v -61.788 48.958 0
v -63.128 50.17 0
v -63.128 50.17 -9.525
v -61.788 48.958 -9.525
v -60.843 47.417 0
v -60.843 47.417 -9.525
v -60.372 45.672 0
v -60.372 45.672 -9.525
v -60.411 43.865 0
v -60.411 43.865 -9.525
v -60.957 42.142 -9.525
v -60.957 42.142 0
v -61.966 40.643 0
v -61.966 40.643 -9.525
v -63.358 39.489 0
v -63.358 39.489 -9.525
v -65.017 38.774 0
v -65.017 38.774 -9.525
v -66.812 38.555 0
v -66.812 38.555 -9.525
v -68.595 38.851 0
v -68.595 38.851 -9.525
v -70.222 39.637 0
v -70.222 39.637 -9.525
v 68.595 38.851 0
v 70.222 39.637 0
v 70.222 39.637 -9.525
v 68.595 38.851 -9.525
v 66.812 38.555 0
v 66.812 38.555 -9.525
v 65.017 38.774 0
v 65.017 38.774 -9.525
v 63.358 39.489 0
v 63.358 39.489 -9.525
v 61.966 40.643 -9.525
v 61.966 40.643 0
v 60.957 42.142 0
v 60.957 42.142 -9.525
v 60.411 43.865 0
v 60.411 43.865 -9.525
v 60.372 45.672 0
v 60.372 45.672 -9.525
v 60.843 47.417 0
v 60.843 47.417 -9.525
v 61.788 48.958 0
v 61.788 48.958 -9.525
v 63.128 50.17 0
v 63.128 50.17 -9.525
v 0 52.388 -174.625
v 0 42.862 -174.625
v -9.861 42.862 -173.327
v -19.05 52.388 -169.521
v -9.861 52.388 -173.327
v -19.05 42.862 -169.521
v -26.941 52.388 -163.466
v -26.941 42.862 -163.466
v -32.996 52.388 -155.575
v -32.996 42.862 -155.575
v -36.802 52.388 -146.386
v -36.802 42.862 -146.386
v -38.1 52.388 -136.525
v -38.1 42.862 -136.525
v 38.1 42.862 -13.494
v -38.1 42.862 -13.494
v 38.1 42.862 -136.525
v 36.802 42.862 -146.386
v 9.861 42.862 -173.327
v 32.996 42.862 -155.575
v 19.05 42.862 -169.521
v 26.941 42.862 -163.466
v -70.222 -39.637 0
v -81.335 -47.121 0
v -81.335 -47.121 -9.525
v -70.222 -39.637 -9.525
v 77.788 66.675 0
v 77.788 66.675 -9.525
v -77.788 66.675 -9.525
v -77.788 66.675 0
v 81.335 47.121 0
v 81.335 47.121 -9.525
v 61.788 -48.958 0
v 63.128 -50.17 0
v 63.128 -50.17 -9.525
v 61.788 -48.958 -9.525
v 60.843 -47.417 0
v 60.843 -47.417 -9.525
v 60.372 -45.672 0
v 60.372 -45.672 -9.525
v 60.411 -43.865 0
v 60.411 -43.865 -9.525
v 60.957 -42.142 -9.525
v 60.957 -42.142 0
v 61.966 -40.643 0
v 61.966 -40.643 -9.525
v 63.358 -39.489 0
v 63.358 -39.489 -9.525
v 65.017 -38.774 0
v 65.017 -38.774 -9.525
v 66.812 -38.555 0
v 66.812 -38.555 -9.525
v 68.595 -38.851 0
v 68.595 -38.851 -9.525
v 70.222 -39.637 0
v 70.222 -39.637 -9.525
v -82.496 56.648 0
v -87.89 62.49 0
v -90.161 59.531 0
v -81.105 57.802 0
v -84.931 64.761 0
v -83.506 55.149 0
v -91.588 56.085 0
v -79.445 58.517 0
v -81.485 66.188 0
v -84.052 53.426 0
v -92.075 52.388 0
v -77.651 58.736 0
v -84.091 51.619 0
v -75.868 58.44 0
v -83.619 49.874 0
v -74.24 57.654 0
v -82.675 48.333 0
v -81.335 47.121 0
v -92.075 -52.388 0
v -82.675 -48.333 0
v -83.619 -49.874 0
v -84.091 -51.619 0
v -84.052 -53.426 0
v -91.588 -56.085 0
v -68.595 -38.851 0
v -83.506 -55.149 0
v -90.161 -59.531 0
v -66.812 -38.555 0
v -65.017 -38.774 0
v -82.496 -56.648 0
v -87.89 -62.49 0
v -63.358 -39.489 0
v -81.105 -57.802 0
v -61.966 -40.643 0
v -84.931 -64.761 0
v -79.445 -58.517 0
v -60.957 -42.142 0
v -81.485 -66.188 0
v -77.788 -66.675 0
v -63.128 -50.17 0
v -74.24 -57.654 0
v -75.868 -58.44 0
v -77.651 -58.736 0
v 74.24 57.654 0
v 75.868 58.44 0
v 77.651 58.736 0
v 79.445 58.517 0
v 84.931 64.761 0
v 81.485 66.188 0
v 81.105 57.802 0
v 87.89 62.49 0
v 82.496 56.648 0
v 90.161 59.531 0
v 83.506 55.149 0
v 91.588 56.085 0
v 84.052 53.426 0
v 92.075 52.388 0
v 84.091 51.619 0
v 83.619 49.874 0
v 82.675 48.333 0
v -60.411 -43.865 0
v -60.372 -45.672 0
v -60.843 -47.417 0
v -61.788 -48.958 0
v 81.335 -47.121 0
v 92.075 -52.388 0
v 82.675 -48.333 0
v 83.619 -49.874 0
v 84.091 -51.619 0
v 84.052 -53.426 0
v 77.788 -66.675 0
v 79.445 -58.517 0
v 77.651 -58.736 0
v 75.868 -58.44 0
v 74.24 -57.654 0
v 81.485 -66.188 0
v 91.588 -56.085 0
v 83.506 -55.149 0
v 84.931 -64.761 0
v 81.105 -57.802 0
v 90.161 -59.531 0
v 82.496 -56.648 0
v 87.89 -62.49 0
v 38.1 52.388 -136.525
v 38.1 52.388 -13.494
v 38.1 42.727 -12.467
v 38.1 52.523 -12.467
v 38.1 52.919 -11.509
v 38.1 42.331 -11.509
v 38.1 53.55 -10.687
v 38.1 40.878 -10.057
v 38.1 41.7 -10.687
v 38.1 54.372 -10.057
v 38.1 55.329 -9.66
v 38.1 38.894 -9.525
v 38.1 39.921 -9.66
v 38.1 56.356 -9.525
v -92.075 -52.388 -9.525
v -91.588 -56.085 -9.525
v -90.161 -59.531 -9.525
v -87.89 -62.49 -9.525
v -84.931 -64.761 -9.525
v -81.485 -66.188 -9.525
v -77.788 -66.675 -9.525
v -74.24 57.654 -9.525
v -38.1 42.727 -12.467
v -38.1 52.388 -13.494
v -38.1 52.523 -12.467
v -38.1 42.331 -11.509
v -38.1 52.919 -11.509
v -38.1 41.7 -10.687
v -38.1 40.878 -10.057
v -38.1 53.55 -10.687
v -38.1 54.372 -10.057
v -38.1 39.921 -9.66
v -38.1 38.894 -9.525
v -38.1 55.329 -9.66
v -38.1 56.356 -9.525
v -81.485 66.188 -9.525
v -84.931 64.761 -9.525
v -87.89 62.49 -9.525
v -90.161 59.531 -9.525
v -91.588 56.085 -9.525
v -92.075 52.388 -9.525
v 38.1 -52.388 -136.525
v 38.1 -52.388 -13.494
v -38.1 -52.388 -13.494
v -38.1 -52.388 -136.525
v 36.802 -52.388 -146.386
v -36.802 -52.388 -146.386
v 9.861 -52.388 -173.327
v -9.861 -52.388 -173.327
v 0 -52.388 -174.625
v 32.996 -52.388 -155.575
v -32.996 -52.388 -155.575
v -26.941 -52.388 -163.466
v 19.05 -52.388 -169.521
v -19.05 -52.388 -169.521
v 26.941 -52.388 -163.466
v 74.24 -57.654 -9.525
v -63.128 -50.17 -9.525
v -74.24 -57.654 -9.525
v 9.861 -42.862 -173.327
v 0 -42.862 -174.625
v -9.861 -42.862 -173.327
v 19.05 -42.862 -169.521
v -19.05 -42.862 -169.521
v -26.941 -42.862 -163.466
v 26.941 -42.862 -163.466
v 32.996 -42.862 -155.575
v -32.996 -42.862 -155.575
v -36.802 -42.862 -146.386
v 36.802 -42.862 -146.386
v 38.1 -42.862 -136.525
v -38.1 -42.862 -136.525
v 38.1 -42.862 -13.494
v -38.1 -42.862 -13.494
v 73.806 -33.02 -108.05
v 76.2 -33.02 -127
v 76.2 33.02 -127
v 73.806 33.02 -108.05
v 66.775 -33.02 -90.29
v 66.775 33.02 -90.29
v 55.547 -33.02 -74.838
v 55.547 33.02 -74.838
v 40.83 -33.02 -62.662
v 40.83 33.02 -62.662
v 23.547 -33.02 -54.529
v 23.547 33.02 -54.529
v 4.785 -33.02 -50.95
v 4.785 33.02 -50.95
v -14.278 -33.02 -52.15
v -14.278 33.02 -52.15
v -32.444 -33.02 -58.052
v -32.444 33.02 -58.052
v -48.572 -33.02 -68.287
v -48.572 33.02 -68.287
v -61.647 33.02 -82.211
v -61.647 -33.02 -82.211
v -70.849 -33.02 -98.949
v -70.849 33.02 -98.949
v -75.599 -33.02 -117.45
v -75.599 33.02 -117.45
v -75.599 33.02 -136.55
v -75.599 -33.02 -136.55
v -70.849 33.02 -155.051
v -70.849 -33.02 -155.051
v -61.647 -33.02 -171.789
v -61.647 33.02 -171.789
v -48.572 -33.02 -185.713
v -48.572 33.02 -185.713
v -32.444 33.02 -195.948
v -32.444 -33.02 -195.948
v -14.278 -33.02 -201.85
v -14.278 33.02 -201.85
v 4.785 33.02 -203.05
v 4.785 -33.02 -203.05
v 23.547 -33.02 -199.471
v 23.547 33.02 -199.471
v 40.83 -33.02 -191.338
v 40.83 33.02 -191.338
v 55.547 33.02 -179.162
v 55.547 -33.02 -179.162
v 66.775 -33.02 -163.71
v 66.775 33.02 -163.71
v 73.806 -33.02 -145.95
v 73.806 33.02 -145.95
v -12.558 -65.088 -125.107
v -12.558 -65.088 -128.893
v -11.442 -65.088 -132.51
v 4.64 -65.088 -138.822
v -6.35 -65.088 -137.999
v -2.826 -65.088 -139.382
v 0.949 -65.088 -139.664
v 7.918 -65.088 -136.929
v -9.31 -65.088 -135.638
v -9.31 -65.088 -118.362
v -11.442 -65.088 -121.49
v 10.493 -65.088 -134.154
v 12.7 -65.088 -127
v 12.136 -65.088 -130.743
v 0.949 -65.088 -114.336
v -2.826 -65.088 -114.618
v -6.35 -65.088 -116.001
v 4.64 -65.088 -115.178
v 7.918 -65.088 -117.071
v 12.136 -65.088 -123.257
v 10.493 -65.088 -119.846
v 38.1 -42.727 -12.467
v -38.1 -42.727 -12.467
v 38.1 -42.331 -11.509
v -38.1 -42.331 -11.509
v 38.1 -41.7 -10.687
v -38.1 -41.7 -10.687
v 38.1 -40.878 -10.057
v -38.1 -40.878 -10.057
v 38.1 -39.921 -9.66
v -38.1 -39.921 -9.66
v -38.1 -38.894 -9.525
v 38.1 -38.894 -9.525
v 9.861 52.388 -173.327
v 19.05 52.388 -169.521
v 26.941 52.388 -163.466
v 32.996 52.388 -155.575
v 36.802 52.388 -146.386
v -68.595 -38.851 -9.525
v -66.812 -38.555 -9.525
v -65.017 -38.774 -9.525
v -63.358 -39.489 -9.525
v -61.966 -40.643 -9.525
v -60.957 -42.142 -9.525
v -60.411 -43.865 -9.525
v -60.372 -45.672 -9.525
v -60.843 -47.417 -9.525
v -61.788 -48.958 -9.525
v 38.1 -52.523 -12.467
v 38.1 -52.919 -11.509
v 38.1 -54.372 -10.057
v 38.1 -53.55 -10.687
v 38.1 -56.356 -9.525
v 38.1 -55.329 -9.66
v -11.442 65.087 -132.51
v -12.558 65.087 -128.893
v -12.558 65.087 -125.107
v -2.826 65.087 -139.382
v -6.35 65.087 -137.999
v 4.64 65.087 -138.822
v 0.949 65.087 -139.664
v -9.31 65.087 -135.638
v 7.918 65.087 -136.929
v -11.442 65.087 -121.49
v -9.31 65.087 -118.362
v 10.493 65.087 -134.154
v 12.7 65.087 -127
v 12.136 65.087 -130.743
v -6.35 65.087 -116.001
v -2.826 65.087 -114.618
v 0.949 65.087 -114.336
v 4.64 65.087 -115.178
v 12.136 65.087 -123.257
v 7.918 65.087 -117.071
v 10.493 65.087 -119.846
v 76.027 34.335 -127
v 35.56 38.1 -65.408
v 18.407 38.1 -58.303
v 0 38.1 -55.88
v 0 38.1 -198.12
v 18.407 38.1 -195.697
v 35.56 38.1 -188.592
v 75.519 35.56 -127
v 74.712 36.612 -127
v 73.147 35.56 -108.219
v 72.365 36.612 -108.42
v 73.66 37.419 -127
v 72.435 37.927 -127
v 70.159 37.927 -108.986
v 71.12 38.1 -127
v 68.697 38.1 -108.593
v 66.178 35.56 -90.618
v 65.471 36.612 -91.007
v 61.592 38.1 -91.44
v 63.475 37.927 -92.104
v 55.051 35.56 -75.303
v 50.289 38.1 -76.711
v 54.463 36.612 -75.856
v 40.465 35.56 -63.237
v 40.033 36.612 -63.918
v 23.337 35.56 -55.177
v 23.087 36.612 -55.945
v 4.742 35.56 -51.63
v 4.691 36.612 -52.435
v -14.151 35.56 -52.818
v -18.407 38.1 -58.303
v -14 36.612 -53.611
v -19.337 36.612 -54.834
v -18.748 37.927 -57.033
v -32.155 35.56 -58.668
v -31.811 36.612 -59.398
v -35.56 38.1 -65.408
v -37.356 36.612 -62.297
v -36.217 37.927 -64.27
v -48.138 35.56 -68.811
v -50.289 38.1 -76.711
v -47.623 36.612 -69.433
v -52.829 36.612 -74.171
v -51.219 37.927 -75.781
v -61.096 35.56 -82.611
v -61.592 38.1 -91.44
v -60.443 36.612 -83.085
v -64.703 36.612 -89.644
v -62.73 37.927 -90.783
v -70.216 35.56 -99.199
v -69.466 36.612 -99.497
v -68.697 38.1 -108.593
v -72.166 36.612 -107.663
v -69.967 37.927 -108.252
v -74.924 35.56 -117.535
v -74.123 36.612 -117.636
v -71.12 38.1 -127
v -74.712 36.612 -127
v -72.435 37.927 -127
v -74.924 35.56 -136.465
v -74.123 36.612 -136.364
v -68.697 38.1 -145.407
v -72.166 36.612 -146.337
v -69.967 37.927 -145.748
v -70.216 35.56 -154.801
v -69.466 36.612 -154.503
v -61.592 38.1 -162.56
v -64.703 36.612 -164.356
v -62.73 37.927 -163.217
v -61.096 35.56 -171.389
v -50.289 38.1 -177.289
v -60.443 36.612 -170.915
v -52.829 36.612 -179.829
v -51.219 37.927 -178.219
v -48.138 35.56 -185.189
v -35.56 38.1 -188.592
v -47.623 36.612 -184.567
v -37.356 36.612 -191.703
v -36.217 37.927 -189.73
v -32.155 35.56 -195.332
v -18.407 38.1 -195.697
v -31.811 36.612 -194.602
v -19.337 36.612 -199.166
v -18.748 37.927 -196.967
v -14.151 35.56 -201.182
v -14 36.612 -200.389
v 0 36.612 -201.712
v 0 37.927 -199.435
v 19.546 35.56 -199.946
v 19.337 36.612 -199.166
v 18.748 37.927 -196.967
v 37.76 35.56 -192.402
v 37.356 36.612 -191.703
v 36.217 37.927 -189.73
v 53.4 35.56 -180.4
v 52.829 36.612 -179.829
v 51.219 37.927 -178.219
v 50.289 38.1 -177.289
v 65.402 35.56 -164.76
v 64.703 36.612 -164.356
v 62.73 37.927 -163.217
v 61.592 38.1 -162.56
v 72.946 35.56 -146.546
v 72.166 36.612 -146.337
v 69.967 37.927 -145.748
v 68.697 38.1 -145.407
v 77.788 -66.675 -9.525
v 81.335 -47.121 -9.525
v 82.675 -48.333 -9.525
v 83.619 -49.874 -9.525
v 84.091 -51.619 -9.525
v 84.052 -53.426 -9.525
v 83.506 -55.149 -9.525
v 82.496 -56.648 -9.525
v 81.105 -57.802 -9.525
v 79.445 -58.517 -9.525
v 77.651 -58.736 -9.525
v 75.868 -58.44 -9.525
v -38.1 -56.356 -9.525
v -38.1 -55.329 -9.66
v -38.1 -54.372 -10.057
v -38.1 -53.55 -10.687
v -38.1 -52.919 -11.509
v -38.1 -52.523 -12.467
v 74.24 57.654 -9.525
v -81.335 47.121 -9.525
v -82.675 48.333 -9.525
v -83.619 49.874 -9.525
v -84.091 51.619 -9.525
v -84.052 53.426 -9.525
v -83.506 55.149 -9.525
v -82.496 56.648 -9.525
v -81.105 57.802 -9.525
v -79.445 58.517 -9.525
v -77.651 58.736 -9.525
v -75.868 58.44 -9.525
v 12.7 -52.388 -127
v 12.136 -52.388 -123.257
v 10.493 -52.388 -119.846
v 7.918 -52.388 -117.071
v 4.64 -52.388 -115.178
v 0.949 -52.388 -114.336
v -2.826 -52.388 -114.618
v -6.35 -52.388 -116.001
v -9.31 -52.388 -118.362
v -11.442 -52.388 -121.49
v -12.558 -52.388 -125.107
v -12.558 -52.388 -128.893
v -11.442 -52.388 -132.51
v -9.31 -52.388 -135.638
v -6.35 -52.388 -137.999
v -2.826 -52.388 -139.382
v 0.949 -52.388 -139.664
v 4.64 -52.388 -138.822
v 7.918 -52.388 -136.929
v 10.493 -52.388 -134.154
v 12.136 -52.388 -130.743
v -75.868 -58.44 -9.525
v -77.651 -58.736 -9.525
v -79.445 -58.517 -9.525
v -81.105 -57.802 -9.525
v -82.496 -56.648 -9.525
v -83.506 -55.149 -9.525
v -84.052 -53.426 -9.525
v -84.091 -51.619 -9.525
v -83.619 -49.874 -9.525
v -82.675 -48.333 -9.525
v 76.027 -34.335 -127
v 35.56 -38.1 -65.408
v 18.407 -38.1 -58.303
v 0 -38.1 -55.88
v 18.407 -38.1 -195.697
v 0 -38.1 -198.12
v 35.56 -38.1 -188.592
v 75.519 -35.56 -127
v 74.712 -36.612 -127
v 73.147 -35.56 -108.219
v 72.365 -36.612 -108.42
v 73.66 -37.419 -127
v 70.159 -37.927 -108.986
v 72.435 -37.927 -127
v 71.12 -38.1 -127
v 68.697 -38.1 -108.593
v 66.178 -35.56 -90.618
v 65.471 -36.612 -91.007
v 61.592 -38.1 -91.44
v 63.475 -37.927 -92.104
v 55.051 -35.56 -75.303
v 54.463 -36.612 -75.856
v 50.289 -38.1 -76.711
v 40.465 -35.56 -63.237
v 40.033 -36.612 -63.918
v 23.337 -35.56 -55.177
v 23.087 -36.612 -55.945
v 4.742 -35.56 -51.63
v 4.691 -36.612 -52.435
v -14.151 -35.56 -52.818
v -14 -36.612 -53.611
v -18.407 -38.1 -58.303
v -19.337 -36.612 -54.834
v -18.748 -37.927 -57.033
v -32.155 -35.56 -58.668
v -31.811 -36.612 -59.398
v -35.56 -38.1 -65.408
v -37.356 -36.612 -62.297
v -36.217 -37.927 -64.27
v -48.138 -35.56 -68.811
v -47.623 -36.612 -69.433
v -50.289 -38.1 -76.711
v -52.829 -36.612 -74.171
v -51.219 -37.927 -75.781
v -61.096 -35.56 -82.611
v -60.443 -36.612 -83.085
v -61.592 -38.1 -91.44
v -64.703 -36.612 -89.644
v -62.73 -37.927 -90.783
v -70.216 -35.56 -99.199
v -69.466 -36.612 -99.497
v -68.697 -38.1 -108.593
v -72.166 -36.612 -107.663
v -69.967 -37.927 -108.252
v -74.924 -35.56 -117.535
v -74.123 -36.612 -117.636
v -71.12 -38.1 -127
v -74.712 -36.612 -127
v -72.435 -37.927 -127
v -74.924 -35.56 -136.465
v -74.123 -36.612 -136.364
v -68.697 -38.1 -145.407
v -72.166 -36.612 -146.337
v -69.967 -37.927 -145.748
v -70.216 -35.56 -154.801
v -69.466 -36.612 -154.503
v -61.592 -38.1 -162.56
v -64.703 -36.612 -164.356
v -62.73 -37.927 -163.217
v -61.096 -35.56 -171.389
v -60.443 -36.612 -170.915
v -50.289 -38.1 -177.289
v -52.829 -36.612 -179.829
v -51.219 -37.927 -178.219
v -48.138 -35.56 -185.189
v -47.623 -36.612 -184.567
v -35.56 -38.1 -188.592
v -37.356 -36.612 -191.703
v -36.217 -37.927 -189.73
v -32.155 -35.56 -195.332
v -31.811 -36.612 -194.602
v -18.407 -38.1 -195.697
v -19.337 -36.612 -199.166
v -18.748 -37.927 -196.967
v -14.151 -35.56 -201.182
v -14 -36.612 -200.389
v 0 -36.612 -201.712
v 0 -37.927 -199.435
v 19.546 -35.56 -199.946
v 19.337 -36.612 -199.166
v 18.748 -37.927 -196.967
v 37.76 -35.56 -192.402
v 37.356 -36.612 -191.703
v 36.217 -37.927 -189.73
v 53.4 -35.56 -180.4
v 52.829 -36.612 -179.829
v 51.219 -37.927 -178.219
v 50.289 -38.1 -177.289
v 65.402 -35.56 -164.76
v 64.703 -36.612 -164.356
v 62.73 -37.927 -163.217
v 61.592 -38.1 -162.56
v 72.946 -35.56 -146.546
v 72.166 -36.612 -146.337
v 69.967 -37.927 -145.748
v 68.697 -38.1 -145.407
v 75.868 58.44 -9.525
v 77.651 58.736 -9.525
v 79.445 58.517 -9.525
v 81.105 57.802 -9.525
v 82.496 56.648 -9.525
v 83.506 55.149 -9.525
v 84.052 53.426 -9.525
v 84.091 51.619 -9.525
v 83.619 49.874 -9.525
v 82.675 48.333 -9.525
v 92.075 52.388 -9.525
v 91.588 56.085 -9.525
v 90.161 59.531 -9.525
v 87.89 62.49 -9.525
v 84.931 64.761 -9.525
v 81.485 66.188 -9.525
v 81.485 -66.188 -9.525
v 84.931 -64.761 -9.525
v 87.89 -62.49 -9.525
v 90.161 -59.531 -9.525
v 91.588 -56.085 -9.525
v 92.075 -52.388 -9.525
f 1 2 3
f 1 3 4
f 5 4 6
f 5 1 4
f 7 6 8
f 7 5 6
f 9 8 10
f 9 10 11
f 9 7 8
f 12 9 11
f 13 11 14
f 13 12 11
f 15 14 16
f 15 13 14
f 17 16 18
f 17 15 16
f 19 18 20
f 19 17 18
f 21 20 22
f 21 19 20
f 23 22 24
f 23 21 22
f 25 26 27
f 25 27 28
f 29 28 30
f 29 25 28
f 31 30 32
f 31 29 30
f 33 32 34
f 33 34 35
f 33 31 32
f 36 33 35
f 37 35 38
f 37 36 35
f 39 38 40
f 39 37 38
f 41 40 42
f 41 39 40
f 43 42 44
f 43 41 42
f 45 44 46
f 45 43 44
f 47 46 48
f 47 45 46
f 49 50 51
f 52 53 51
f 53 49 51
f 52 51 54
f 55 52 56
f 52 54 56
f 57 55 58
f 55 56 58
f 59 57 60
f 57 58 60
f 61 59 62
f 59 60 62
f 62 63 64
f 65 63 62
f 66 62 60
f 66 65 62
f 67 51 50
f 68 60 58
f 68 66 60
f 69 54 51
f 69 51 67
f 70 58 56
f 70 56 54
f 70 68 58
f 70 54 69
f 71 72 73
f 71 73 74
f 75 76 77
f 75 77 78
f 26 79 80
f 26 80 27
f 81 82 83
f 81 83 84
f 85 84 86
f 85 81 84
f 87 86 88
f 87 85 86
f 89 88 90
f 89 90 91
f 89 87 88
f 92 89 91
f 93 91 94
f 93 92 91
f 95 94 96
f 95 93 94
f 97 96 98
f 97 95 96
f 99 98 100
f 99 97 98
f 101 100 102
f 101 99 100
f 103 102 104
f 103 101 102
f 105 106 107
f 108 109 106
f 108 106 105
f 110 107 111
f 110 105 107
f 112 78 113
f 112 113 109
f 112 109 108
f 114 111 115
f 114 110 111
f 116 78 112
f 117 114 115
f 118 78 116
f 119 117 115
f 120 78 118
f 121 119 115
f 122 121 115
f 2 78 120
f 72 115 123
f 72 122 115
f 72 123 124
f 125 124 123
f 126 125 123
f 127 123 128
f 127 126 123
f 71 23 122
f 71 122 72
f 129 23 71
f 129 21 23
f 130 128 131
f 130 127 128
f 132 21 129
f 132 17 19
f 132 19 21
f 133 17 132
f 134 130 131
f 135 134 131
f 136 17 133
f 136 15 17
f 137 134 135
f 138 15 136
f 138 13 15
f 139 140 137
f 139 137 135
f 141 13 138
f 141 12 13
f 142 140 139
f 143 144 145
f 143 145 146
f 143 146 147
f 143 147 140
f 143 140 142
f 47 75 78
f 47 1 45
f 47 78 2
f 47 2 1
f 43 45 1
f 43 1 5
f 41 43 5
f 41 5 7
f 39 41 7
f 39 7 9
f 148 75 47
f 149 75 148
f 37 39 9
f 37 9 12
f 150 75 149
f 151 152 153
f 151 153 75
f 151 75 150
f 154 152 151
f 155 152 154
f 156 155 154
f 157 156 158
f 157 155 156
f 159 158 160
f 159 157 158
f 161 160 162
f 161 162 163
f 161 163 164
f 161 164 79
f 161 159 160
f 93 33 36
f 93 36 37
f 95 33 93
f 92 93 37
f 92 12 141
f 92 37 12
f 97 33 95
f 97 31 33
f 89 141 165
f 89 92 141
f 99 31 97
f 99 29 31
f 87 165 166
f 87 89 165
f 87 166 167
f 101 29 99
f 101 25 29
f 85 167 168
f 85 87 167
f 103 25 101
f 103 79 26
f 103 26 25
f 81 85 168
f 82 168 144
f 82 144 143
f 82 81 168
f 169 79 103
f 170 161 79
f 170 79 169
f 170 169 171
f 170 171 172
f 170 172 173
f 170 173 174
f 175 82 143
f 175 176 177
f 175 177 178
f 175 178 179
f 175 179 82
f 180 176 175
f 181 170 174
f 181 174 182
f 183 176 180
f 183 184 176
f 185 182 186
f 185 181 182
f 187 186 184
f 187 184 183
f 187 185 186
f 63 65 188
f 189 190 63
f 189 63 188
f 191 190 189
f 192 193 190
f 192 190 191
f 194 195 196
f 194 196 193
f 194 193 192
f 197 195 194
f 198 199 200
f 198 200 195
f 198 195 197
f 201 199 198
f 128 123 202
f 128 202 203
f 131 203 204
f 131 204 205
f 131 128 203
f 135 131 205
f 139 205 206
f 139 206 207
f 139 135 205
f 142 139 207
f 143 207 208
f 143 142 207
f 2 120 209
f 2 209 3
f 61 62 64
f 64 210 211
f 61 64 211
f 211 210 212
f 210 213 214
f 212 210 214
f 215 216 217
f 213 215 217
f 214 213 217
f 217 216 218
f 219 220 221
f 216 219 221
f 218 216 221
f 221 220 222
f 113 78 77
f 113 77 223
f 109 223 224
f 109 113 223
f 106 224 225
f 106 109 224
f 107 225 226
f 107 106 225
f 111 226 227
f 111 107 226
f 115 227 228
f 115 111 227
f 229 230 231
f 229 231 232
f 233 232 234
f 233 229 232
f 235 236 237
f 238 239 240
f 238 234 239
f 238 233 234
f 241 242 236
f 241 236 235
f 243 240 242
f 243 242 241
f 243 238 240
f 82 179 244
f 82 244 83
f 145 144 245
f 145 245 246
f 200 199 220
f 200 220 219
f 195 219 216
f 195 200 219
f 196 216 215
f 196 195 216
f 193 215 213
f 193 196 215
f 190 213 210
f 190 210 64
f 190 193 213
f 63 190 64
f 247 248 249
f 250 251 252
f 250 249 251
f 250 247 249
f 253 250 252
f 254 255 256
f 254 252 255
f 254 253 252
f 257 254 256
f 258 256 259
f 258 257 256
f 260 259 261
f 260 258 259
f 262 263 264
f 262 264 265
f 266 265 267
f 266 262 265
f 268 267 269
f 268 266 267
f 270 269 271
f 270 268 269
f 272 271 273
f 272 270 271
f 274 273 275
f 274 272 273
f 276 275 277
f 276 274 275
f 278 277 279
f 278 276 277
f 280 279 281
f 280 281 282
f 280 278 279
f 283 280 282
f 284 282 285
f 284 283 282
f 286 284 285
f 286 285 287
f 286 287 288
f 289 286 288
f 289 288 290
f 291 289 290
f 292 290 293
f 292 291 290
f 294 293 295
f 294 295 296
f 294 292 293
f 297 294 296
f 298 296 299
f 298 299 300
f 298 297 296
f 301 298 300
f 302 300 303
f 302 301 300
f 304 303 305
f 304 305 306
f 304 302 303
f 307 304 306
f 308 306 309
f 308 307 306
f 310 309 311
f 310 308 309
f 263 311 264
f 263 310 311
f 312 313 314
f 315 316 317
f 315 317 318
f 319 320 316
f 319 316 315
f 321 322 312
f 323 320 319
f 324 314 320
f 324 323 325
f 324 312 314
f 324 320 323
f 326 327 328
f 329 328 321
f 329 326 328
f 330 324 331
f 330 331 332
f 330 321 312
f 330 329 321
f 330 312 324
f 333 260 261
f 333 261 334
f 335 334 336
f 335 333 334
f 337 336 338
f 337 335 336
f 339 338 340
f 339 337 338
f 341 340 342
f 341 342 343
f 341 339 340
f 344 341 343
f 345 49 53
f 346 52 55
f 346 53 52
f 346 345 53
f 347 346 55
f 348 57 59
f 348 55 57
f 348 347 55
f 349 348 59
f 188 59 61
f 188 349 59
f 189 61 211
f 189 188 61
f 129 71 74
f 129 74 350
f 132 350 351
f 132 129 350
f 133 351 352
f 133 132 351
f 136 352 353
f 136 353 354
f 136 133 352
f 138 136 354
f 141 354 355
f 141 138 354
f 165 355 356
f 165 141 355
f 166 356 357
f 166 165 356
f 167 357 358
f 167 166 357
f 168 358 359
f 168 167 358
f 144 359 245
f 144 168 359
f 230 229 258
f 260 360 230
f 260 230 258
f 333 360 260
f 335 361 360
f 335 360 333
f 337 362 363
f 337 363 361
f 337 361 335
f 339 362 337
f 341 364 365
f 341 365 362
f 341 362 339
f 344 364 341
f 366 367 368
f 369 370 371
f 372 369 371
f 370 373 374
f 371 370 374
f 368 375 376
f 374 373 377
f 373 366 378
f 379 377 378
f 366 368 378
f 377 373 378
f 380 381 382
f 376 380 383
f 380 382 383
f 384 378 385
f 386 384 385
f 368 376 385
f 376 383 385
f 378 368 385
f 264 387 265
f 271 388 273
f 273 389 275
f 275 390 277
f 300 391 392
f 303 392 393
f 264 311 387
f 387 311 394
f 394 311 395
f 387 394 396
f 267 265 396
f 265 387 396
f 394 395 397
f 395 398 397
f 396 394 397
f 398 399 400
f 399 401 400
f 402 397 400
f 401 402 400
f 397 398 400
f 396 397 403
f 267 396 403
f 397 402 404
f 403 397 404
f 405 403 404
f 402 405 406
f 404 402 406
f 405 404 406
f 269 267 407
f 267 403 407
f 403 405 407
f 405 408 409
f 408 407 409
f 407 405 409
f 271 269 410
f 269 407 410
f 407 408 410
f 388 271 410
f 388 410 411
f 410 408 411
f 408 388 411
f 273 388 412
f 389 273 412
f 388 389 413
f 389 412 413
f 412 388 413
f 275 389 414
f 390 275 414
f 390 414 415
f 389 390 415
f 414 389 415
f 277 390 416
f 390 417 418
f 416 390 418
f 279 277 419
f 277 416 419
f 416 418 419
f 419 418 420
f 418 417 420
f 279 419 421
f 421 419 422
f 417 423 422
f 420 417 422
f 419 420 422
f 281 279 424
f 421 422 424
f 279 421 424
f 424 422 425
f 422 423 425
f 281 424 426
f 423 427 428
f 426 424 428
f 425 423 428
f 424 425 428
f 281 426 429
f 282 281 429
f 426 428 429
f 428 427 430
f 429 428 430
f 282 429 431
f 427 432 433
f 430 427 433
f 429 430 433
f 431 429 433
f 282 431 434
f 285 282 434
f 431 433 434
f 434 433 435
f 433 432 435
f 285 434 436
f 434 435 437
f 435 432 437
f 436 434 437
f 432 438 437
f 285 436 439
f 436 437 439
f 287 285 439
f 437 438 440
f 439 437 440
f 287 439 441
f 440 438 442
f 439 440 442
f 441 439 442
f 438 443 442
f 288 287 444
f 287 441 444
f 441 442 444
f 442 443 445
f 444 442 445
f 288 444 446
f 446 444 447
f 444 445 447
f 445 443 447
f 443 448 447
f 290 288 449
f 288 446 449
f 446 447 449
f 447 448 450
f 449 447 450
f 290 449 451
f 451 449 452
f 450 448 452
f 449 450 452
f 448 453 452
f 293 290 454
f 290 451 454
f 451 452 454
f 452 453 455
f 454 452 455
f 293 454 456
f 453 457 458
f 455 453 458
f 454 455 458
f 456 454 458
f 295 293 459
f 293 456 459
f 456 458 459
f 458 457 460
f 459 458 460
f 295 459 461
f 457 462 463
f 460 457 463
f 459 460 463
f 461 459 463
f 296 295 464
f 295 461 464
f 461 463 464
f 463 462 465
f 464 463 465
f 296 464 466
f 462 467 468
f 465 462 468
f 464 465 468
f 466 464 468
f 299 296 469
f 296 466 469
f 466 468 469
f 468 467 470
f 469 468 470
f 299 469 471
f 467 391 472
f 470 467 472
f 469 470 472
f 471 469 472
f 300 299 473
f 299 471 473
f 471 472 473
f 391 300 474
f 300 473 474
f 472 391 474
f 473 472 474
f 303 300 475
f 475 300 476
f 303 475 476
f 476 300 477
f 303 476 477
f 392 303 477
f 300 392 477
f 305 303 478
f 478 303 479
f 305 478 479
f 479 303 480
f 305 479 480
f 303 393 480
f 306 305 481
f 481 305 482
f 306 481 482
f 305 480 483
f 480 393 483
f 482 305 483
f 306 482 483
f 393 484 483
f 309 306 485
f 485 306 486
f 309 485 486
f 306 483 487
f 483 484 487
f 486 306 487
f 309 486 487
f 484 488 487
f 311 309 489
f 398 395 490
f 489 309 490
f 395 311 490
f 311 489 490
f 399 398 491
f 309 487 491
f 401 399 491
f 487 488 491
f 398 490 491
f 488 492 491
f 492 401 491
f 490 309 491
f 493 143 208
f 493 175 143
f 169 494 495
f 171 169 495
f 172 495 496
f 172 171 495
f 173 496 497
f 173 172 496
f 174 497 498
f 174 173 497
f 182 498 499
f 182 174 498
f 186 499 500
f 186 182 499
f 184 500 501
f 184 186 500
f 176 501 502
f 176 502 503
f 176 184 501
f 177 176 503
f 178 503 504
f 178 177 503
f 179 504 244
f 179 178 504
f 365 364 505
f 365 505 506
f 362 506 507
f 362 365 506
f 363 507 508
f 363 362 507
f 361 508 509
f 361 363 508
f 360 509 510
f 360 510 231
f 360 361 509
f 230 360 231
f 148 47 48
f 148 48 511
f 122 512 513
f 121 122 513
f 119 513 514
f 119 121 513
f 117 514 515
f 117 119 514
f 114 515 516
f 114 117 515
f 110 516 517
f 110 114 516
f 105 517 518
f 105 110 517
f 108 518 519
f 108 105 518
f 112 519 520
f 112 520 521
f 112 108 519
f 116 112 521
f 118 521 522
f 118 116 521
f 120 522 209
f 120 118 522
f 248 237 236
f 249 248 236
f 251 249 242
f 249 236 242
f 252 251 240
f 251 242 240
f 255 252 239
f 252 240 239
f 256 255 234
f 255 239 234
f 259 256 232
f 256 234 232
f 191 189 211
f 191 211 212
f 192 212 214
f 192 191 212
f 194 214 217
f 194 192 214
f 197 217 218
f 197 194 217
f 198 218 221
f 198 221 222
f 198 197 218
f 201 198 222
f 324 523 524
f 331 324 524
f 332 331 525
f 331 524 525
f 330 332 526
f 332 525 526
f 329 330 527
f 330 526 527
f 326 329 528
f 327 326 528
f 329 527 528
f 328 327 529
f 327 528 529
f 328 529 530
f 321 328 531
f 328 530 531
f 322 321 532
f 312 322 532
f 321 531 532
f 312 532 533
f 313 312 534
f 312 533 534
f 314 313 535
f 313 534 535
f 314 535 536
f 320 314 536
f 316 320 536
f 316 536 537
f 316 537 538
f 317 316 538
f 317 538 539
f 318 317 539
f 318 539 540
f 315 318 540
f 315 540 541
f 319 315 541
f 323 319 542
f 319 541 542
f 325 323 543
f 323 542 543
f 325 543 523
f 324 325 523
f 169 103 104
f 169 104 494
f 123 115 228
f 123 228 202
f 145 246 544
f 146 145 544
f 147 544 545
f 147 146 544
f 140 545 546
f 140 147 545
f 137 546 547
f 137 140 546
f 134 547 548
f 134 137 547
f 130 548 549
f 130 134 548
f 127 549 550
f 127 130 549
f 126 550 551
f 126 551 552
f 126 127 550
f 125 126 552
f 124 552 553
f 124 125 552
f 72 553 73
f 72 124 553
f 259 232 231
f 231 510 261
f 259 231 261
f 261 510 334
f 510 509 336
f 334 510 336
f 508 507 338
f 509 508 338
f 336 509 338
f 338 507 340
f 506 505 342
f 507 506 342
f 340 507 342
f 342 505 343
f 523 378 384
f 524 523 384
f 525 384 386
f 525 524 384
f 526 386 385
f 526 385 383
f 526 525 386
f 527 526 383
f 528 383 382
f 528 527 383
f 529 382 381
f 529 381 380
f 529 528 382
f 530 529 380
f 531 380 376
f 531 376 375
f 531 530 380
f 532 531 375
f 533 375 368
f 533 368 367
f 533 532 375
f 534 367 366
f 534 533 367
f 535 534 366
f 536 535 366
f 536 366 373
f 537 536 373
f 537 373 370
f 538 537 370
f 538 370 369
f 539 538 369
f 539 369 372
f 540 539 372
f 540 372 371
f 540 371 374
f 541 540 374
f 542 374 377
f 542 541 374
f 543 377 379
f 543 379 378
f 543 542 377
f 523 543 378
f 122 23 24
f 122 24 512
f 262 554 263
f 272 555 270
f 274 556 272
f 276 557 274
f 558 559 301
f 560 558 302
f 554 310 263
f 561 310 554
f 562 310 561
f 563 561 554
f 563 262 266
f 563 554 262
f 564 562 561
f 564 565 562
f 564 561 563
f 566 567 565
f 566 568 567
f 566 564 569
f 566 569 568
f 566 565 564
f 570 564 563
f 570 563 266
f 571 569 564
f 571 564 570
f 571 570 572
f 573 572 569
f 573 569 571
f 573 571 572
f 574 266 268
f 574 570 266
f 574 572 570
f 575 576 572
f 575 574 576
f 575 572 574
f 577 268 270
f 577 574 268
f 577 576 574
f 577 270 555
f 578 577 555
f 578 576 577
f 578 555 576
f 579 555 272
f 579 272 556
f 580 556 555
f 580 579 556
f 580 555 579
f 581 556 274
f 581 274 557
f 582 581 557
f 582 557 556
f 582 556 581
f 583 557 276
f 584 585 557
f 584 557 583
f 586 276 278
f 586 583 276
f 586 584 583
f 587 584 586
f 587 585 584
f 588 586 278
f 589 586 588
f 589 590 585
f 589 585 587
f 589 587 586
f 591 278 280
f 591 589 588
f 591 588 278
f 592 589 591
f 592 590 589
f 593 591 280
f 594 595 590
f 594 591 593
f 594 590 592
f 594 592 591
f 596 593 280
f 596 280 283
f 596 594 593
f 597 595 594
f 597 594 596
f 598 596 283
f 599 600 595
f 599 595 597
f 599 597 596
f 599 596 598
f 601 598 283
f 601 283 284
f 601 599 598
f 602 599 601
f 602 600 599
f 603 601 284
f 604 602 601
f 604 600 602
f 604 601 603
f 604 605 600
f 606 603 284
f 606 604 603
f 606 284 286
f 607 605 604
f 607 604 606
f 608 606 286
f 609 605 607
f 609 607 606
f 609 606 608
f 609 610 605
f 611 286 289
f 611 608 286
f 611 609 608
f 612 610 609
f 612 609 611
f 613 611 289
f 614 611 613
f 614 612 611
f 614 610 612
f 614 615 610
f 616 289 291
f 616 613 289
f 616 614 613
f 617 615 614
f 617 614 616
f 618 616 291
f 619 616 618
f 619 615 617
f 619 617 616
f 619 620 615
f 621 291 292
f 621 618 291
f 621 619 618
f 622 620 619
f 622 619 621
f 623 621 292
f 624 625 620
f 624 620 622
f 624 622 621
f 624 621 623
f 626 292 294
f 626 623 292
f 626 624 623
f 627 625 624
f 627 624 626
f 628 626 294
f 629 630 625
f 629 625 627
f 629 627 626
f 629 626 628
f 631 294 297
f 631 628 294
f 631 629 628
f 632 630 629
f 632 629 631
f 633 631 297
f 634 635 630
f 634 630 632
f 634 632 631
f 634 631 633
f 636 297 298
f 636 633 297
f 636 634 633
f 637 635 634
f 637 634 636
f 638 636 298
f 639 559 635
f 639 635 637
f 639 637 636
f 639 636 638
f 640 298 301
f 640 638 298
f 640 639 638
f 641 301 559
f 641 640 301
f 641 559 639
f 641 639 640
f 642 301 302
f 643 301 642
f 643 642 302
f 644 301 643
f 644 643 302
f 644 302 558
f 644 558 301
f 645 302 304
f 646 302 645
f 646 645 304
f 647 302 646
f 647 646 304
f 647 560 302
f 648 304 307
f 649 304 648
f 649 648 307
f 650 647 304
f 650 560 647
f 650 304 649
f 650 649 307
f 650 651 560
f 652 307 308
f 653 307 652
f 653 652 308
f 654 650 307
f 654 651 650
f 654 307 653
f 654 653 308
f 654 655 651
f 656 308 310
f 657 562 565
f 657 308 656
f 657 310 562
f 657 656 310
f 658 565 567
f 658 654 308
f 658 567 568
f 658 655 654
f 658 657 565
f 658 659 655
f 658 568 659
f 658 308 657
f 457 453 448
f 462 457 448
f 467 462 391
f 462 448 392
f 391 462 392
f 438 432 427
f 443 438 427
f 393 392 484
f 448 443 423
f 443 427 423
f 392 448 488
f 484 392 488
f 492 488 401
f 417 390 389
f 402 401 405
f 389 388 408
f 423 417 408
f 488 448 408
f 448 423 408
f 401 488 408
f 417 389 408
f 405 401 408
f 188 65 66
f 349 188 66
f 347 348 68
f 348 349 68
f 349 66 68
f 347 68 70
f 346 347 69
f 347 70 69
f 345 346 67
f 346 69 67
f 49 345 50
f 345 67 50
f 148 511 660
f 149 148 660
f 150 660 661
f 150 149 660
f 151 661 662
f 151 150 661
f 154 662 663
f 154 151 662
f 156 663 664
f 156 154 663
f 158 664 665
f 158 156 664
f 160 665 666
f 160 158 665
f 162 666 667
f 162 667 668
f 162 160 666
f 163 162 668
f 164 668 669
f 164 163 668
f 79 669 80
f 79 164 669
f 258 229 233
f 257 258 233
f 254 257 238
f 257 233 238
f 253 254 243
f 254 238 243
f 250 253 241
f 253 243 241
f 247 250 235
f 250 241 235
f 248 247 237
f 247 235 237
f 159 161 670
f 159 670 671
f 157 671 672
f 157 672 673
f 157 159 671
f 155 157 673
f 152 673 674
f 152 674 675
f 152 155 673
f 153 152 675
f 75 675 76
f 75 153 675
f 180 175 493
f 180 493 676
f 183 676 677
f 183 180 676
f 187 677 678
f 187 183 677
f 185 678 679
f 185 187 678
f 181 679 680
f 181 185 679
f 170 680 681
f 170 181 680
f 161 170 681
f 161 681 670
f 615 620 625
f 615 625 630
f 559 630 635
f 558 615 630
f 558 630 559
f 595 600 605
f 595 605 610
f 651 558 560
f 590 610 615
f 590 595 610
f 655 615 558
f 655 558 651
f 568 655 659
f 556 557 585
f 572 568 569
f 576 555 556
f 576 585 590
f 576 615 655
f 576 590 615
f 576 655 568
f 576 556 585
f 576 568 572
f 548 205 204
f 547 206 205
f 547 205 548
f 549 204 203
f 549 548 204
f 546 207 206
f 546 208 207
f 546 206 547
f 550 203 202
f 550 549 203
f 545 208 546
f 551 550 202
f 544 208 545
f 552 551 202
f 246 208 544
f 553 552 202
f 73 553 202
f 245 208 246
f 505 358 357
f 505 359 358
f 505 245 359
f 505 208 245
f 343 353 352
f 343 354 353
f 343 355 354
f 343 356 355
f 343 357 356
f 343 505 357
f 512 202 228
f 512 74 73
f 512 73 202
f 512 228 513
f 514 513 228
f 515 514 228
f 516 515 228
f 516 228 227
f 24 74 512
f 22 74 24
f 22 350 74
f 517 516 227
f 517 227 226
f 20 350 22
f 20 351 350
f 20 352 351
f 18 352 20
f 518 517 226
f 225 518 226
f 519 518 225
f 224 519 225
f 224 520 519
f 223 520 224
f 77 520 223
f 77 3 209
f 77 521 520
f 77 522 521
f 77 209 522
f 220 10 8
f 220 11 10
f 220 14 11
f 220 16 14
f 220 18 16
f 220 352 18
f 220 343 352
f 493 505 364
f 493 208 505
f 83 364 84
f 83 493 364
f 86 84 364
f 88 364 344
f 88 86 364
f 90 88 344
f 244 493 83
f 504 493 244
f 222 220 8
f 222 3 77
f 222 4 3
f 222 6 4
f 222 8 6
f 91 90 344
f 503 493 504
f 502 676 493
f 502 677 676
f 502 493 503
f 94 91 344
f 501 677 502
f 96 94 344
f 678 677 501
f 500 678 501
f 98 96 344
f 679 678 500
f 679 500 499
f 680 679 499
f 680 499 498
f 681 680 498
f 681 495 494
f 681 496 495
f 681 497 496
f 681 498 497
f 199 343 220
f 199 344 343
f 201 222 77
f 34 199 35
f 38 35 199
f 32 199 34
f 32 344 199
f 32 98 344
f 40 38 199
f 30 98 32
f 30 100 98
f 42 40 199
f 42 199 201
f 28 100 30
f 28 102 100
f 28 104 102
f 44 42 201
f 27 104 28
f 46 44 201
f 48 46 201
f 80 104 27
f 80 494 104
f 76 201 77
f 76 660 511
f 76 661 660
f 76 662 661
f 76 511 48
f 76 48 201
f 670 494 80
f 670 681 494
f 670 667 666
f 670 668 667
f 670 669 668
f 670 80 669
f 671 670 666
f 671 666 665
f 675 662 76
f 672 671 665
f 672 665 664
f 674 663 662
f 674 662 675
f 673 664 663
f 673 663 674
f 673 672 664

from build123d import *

# Parameters (mm, degrees)
F1_DEPTH       = 9.525
F4_DEPTH       = 76.2
F6_DEPTH       = 119.0635
F9_DEPTH       = 76.2
F10_R          = 5.08
F11_R          = 12.7
F12_DEPTH      = 117.475
F12_DEPTH_BACK = 12.7


with BuildPart() as f1:
    # F0 (on Top) → F1 (new body)
    with BuildSketch(Plane.XY):
        with BuildLine():
            Line((-77.7875, -66.675), (77.7875, -66.675))
            ThreePointArc((77.7875, -66.675), (87.8902881362, -62.4902881362), (92.075, -52.3875))
            Line((92.075, -52.3875), (92.075, 52.3875))
            ThreePointArc((92.075, 52.3875), (87.8902881362, 62.4902881362), (77.7875, 66.675))
            Line((77.7875, 66.675), (-77.7875, 66.675))
            ThreePointArc((-77.7875, 66.675), (-87.8902881362, 62.4902881362), (-92.075, 52.3875))
            Line((-92.075, 52.3875), (-92.075, -52.3875))
            ThreePointArc((-92.075, -52.3875), (-87.8902881362, -62.4902881362), (-77.7875, -66.675))
        make_face()
        with BuildLine():
            ThreePointArc((-74.2403875903, -57.6544244871), (-83.0544244871, -55.9346124097), (-81.3346124097, -47.1205755129))
            Line((-81.3346124097, -47.1205755129), (-70.2221124097, -39.6366469415))
            ThreePointArc((-70.2221124097, -39.6366469415), (-61.4080755129, -41.3564590189), (-63.1278875903, -50.1704959157))
            Line((-63.1278875903, -50.1704959157), (-74.2403875903, -57.6544244871))
        make_face(mode=Mode.SUBTRACT)
        with BuildLine():
            ThreePointArc((81.3346124097, -47.1205755129), (83.0544244871, -55.9346124097), (74.2403875903, -57.6544244871))
            Line((74.2403875903, -57.6544244871), (63.1278875903, -50.1704959157))
            ThreePointArc((63.1278875903, -50.1704959157), (61.4080755129, -41.3564590189), (70.2221124097, -39.6366469415))
            Line((70.2221124097, -39.6366469415), (81.3346124097, -47.1205755129))
        make_face(mode=Mode.SUBTRACT)
        with BuildLine():
            ThreePointArc((-81.3346124097, 47.1205755129), (-83.0544244871, 55.9346124097), (-74.2403875903, 57.6544244871))
            Line((-74.2403875903, 57.6544244871), (-63.1278875903, 50.1704959157))
            ThreePointArc((-63.1278875903, 50.1704959157), (-61.4080755129, 41.3564590189), (-70.2221124097, 39.6366469415))
            Line((-70.2221124097, 39.6366469415), (-81.3346124097, 47.1205755129))
        make_face(mode=Mode.SUBTRACT)
        with BuildLine():
            ThreePointArc((74.2403875903, 57.6544244871), (83.0544244871, 55.9346124097), (81.3346124097, 47.1205755129))
            Line((81.3346124097, 47.1205755129), (70.2221124097, 39.6366469415))
            ThreePointArc((70.2221124097, 39.6366469415), (61.4080755129, 41.3564590189), (63.1278875903, 50.1704959157))
            Line((63.1278875903, 50.1704959157), (74.2403875903, 57.6544244871))
        make_face(mode=Mode.SUBTRACT)
    extrude(amount=-F1_DEPTH)

    # F3 (on offset) → F4 (join)
    with BuildSketch(Plane.YZ.offset(38.1)):
        Polygon((-66.675, 0), (-66.675, -9.525), (-56.35625, -9.525), (-52.3875, -9.525), (-38.89375, -9.525), (38.89375, -9.525), (52.3875, -9.525), (56.35625, -9.525), (66.675, -9.525), (66.675, 0), (52.3875, 0), (-52.3875, 0), align=None)
        with BuildLine():
            Line((-52.3875, -9.525), (-56.35625, -9.525))
            ThreePointArc((-56.35625, -9.525), (-53.5499199622, -10.6874199622), (-52.3875, -13.49375))
            Line((-52.3875, -13.49375), (-52.3875, -174.625))
            Line((-52.3875, -174.625), (-42.8625, -174.625))
            Line((-42.8625, -174.625), (-42.8625, -13.49375))
            ThreePointArc((-42.8625, -13.49375), (-41.7000800378, -10.6874199622), (-38.89375, -9.525))
            Line((-38.89375, -9.525), (-52.3875, -9.525))
        make_face()
        with BuildLine():
            Line((52.3875, -9.525), (38.89375, -9.525))
            ThreePointArc((38.89375, -9.525), (41.7000800378, -10.6874199622), (42.8625, -13.49375))
            Line((42.8625, -13.49375), (42.8625, -174.625))
            Line((42.8625, -174.625), (52.3875, -174.625))
            Line((52.3875, -174.625), (52.3875, -13.49375))
            ThreePointArc((52.3875, -13.49375), (53.5499199622, -10.6874199622), (56.35625, -9.525))
            Line((56.35625, -9.525), (52.3875, -9.525))
        make_face()
    extrude(amount=-F4_DEPTH)

    # F5 (on face) → F6 (cut, through all)
    with BuildSketch(Plane.XZ.offset(52.3875)):
        with BuildLine():
            ThreePointArc((38.1, -136.525), (26.9407683678, -163.4657683586), (1.29e-08, -174.625))
            Line((1.29e-08, -174.625), (38.1, -174.625))
            Line((38.1, -174.625), (38.1, -136.525))
        make_face()
        with BuildLine():
            ThreePointArc((1.29e-08, -174.625), (-26.9407683586, -163.4657683678), (-38.1, -136.525))
            Line((-38.1, -136.525), (-38.1, -174.625))
            Line((-38.1, -174.625), (1.29e-08, -174.625))
        make_face()
    extrude(amount=-F6_DEPTH, mode=Mode.SUBTRACT)


with BuildPart() as f9:
    # F8 (on offset) → F9 (new body)
    with BuildSketch(Plane.XZ.offset(38.1)):
        with BuildLine():
            ThreePointArc((0, -50.8), (-53.8815367264, -180.8815367264), (76.2, -127))
            ThreePointArc((76.2, -127), (53.8815367264, -73.1184632736), (0, -50.8))
        make_face()
    extrude(amount=-F9_DEPTH)

    # F10
    f10_edges = [f9.edges().sort_by_distance(p)[0] for p in [
        (-76.2, -38.1, -127),
        (-76.2, 38.1, -127),
    ]]
    fillet(f10_edges, radius=F10_R)


with BuildPart() as f12:
    # F11 (on face) → F12 (new body, two sides)
    with BuildSketch(Plane.XZ.offset(52.3875)) as f12_sk:
        with Locations((0, -127)):
            Circle(F11_R)
    extrude(amount=-F12_DEPTH)
    extrude(f12_sk.sketch, amount=F12_DEPTH_BACK)


solid = Compound([f1.part, f9.part, f12.part])
